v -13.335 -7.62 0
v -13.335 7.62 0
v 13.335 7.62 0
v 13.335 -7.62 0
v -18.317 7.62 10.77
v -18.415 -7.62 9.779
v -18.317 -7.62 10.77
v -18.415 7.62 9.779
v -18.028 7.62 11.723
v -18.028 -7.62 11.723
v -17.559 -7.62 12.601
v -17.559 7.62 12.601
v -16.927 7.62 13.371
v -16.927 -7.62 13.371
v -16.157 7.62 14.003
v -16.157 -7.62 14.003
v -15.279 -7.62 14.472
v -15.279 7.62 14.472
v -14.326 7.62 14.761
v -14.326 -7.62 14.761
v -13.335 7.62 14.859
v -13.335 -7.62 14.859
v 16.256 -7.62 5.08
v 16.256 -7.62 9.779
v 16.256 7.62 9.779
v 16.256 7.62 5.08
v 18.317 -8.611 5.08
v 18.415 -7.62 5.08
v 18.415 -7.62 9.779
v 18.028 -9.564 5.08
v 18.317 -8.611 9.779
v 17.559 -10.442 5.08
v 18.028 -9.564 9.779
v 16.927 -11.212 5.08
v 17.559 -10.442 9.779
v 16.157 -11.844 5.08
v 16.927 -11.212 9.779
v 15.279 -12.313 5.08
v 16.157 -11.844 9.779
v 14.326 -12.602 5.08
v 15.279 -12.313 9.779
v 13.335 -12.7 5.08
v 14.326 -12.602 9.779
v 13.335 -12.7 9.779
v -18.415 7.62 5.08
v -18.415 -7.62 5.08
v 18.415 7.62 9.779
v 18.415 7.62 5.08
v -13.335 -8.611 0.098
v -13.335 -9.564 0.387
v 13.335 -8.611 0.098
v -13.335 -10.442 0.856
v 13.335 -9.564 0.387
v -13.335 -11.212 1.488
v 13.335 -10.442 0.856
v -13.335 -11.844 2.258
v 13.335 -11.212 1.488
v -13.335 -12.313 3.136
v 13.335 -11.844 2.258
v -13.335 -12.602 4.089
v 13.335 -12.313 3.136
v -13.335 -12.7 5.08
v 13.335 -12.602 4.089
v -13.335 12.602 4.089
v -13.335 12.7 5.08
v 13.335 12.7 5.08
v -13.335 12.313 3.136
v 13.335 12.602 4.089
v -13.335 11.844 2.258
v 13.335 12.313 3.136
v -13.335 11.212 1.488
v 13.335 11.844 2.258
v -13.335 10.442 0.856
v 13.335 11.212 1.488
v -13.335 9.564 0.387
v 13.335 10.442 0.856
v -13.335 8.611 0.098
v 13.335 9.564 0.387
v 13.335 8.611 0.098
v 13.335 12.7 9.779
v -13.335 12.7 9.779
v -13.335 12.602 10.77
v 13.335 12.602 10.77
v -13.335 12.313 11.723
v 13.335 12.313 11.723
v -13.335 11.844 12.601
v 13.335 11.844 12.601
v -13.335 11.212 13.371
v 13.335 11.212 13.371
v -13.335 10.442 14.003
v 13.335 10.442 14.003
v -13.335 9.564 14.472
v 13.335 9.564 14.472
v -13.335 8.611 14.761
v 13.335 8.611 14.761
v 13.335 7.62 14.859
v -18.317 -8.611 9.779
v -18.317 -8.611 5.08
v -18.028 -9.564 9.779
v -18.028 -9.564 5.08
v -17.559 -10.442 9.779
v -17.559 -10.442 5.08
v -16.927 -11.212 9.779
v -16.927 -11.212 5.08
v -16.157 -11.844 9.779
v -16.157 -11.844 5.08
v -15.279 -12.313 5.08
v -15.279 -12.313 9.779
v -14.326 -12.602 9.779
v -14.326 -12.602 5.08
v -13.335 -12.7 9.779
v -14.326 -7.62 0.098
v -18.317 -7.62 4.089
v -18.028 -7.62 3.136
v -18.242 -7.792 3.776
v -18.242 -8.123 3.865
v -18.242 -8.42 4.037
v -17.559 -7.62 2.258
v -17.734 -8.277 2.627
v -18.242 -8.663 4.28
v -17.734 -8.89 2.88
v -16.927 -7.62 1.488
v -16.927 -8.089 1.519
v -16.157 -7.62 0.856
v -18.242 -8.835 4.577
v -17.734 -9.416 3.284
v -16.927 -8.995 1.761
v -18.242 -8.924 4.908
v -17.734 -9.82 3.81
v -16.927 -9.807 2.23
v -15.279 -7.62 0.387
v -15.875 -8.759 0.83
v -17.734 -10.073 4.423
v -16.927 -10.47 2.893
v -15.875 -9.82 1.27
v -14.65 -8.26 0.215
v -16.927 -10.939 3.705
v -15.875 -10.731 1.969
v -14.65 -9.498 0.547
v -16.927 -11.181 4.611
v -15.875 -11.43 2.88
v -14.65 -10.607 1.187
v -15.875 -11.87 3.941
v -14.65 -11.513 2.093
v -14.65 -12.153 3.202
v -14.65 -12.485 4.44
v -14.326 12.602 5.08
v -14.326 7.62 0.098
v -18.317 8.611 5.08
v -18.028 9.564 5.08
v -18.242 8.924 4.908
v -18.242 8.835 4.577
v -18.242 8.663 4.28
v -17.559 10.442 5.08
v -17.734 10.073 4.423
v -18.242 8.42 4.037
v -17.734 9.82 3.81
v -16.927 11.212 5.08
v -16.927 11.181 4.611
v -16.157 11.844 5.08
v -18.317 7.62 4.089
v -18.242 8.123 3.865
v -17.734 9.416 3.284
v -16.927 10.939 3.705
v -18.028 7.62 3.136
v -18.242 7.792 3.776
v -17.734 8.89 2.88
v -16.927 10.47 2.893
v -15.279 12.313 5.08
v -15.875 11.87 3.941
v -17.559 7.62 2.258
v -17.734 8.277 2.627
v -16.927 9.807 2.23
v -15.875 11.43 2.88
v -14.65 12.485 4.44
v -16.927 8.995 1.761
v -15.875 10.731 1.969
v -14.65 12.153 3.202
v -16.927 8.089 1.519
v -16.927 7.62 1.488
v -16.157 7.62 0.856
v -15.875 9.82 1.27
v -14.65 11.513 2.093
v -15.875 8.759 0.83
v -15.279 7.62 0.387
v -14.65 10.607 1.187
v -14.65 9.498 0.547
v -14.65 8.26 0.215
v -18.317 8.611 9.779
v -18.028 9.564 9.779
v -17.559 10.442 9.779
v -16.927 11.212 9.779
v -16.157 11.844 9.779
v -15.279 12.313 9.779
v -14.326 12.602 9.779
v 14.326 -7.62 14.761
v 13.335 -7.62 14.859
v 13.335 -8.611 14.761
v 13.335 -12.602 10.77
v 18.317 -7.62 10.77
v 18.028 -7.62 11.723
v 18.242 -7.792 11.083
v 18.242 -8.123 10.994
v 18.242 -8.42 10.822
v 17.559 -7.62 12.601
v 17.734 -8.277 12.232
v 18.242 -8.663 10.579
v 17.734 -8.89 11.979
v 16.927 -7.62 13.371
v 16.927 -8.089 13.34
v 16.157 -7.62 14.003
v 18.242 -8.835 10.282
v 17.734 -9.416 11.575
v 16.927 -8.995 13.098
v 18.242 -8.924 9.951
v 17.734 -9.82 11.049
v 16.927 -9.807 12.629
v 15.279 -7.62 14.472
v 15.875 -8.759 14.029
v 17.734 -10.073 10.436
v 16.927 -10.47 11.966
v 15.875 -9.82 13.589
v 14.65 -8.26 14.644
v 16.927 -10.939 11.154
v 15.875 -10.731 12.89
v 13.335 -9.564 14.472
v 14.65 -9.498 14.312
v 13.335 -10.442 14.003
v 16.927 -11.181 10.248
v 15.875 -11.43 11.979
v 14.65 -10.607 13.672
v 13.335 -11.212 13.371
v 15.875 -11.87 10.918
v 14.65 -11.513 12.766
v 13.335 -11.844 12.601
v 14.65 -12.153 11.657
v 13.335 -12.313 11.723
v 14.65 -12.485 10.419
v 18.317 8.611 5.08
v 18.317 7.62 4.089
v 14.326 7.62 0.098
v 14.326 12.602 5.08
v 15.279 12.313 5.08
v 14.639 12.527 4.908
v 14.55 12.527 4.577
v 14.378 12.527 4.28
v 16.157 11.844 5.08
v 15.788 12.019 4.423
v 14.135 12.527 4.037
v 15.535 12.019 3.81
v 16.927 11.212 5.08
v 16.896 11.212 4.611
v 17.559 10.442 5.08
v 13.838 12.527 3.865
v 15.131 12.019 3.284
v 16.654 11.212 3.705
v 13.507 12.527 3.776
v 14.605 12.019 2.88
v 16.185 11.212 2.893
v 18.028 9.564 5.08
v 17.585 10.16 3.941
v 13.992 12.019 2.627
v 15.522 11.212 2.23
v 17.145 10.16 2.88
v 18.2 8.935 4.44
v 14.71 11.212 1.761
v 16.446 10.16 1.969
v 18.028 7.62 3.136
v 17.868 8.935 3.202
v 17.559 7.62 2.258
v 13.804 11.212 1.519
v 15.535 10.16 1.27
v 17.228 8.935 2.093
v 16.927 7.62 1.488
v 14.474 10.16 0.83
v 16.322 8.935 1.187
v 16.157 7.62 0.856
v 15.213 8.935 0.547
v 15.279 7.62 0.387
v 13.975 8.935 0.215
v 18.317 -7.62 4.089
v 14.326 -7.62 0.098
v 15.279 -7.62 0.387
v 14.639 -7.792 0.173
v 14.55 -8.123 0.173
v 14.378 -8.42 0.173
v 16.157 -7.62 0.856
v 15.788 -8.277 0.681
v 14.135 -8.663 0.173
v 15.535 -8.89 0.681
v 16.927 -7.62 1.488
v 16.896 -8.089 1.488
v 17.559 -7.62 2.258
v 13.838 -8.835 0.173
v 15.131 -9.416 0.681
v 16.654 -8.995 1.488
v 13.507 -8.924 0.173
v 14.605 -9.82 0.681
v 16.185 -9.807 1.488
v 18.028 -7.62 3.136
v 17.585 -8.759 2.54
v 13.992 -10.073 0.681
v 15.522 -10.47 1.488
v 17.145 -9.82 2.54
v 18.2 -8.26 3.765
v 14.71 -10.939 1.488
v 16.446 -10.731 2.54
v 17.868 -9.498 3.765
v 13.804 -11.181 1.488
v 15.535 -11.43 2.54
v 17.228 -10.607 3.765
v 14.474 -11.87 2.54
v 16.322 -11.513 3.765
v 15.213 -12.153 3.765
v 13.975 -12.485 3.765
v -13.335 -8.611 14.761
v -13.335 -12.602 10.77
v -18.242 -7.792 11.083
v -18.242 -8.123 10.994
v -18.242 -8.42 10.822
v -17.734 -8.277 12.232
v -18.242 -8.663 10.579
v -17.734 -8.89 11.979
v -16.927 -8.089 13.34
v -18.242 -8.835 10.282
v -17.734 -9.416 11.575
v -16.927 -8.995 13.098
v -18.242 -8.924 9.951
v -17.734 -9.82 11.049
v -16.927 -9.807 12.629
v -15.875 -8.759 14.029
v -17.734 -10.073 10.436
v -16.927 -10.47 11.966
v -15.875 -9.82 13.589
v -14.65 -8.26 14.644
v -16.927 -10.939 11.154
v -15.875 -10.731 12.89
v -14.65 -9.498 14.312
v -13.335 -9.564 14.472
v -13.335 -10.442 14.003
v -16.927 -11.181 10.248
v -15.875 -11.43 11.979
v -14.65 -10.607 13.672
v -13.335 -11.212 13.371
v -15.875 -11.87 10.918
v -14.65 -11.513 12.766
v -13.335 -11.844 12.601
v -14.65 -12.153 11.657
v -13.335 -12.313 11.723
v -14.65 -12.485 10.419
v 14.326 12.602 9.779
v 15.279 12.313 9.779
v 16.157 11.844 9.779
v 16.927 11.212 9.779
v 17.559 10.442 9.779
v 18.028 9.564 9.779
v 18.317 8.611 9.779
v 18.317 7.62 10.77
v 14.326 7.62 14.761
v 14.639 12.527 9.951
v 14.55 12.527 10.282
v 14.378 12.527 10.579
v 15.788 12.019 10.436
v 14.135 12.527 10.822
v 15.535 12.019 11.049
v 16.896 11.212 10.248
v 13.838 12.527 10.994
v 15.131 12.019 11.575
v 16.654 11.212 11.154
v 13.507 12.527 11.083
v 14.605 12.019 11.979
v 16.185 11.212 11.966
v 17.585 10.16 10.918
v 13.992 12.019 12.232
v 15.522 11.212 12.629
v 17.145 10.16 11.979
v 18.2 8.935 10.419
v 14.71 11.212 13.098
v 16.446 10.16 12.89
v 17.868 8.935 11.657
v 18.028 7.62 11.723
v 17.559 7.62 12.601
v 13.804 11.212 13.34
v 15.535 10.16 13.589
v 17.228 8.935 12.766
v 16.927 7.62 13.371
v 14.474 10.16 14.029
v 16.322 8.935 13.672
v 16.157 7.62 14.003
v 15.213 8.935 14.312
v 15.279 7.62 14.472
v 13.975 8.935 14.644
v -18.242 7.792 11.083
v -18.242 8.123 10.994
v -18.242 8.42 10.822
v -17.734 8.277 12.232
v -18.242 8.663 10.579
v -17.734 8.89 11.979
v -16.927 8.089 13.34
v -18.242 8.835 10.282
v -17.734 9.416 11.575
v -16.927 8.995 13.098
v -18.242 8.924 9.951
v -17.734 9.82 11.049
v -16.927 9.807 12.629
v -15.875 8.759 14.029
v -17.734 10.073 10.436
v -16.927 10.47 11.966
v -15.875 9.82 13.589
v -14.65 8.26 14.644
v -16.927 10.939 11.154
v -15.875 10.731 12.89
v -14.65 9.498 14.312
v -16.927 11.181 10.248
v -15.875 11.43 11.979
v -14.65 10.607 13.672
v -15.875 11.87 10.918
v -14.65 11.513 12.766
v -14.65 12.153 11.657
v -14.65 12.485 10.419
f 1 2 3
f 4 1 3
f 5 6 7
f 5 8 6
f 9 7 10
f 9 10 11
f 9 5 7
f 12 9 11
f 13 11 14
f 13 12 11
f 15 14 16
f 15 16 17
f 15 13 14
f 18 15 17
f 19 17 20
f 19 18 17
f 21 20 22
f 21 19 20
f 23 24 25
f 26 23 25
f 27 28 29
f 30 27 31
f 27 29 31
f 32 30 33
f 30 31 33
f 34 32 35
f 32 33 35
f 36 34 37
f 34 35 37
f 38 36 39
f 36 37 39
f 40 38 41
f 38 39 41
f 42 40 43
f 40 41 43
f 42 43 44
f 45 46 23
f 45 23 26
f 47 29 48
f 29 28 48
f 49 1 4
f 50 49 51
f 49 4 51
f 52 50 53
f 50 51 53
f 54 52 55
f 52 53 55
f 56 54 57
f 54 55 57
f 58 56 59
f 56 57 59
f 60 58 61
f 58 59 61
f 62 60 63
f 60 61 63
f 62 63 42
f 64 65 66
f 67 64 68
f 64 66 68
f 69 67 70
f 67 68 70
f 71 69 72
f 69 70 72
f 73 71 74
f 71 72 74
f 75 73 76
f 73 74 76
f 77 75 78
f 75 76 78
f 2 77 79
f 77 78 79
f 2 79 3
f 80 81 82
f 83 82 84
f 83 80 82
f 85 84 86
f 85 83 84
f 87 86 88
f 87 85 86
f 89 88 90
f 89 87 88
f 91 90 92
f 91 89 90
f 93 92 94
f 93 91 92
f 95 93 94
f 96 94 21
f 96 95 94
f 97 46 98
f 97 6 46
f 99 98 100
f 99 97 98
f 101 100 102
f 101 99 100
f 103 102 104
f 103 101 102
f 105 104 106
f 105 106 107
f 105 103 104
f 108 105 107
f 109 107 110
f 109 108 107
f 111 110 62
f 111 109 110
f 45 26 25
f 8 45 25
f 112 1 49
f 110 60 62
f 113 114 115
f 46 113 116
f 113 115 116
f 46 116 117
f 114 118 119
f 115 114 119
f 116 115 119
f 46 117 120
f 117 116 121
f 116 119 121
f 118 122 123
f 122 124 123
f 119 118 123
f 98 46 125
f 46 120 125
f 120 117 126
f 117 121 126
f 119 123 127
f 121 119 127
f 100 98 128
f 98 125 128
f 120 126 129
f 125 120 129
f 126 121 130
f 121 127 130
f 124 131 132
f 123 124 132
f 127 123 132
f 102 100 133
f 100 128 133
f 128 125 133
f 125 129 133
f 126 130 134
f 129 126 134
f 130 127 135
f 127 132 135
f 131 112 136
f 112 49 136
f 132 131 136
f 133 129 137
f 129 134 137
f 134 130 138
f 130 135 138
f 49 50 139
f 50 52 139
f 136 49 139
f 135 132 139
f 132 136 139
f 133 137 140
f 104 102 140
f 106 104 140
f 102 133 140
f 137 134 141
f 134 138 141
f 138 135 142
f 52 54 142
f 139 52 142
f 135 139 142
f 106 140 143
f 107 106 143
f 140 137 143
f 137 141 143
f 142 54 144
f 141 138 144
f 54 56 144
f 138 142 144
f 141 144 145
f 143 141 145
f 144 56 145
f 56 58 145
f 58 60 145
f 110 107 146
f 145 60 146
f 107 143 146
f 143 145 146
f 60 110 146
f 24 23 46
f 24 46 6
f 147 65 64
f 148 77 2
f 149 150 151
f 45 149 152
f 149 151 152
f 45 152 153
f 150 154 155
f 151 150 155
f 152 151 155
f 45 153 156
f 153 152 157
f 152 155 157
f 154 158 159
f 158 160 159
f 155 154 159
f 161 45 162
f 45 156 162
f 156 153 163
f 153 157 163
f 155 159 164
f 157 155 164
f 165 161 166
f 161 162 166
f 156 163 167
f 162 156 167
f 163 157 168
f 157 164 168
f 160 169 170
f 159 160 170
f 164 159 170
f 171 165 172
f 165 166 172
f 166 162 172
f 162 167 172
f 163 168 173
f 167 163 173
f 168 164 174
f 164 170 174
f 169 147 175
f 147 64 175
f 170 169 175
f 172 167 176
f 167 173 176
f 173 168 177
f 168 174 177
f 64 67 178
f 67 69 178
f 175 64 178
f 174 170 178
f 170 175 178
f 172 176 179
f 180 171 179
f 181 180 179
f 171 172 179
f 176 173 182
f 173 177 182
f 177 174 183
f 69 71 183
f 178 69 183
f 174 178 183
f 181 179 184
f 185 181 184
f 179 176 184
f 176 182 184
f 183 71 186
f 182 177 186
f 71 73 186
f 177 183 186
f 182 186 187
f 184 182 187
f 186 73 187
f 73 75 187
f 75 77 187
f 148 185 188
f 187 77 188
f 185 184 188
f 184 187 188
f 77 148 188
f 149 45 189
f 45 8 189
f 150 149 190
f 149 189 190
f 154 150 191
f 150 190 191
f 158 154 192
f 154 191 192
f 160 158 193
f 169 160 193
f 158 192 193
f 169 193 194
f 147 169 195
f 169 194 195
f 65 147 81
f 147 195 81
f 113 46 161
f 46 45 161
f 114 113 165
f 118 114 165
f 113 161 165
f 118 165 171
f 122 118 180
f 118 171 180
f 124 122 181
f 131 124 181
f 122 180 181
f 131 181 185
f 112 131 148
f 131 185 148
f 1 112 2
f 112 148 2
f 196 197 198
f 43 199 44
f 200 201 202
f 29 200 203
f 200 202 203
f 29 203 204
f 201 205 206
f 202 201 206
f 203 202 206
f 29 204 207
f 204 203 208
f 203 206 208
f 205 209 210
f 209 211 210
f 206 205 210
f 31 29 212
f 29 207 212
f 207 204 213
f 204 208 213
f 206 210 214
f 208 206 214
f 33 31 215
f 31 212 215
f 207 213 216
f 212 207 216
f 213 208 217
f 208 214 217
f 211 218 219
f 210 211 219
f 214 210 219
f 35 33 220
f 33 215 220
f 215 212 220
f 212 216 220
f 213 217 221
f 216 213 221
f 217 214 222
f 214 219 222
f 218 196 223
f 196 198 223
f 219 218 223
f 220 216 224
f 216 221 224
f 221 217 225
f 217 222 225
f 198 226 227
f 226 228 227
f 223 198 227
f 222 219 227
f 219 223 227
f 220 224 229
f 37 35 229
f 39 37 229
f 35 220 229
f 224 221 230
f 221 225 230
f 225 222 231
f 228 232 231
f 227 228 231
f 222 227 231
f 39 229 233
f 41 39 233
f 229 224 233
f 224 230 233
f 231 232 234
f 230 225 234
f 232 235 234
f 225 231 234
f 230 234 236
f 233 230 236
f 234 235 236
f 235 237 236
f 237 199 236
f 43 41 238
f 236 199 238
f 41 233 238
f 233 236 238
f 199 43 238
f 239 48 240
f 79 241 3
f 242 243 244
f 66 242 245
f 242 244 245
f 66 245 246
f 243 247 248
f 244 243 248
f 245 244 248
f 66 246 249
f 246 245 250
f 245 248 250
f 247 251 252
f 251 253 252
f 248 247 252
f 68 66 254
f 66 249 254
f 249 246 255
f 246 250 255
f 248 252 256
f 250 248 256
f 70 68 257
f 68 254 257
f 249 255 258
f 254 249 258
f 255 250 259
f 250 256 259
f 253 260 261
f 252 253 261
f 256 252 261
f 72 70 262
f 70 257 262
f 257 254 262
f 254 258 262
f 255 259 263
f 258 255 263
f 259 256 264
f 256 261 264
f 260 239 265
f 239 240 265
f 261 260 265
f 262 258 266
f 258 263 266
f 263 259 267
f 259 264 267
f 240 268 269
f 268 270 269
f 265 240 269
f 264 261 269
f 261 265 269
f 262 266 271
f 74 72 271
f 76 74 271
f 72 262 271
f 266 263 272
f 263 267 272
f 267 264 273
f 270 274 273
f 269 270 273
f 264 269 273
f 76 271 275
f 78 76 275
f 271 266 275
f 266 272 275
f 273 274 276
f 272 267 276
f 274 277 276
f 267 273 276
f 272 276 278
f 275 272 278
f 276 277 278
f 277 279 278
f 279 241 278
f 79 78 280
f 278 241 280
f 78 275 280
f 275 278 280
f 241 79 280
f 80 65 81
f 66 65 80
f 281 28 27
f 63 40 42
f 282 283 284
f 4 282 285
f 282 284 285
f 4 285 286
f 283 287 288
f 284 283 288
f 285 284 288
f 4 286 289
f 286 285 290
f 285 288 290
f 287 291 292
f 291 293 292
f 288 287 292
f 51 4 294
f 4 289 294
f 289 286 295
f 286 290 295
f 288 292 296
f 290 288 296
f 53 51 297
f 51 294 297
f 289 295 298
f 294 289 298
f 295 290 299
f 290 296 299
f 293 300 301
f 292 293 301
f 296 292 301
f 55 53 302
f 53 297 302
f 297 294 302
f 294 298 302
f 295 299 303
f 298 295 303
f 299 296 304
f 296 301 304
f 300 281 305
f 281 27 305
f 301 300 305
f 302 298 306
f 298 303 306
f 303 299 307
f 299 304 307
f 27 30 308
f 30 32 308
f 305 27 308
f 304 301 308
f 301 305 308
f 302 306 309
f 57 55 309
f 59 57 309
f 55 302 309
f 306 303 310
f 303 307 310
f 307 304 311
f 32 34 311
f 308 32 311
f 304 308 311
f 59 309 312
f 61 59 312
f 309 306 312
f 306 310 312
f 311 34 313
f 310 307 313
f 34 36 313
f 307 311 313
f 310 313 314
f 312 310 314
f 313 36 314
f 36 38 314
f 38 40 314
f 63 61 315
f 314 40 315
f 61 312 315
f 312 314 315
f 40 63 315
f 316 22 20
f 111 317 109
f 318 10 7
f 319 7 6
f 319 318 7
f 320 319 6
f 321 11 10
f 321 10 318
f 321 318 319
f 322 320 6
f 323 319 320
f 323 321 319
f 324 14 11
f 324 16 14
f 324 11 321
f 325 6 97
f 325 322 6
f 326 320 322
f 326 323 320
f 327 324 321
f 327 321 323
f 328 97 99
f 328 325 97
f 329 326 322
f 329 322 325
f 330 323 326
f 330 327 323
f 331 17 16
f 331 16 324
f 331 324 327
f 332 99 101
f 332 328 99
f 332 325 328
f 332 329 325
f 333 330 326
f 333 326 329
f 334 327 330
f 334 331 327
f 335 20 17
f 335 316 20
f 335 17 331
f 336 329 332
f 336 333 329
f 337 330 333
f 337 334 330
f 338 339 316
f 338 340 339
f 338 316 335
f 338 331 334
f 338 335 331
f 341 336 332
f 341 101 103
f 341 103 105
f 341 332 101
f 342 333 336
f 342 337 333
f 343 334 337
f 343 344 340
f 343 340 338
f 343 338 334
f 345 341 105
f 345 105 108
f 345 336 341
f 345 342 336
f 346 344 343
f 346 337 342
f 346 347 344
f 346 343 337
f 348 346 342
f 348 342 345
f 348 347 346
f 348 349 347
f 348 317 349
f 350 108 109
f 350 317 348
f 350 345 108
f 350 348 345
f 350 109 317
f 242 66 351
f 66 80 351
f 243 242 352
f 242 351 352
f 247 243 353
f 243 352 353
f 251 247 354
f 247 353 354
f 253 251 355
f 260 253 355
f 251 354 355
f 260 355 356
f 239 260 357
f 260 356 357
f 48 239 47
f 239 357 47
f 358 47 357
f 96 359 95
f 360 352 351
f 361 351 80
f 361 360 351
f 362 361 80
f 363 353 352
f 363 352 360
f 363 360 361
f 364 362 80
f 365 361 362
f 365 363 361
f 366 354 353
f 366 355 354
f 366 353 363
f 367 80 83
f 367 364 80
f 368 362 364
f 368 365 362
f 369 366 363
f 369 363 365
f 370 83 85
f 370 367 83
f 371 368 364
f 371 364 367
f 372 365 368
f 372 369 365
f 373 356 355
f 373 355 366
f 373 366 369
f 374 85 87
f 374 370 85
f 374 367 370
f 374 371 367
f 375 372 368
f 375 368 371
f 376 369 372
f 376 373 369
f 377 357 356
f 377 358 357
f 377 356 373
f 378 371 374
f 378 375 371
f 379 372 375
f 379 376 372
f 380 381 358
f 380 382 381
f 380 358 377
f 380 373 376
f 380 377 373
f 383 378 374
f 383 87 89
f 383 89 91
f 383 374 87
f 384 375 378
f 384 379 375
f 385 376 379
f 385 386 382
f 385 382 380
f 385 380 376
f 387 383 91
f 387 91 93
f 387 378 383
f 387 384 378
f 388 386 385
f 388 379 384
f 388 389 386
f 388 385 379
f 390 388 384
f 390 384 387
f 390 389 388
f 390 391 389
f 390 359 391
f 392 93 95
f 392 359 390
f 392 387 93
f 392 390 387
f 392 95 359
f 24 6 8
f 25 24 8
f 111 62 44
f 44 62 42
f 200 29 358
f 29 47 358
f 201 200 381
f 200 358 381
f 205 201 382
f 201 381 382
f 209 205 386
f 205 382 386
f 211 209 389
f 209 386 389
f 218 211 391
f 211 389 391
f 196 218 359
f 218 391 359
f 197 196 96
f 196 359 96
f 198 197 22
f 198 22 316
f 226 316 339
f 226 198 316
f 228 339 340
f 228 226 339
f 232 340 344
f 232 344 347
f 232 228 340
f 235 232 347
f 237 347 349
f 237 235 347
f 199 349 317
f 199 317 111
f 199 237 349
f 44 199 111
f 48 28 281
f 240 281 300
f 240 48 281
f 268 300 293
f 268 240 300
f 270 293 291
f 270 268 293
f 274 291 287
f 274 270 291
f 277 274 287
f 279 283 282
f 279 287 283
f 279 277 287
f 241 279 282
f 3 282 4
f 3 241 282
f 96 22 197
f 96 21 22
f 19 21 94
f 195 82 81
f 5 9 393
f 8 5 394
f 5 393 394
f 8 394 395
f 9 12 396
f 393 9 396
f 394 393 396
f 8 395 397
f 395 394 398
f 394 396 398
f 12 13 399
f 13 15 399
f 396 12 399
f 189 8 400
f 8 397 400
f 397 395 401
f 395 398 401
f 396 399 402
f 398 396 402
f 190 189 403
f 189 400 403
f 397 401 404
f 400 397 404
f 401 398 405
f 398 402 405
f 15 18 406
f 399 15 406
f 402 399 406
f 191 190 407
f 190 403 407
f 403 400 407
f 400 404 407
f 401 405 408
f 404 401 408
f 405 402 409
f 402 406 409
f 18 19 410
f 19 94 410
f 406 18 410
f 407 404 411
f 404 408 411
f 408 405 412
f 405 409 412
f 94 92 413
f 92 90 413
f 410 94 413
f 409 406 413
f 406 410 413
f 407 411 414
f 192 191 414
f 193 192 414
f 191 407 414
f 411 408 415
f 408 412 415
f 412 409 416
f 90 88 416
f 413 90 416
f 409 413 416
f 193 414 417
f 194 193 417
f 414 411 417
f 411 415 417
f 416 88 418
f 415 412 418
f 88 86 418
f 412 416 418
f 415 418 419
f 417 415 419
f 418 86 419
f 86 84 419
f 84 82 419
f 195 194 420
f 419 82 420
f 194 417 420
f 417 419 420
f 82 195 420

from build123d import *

# Parameters (mm, degrees)
F0_W     = 36.83
F0_H     = 25.4
F1_DEPTH = 14.859
F2_W     = 15.24
F2_H     = 4.699
F3_DEPTH = 18.542
F4_DEPTH = 16.256
F5_R     = 5.07999


# Not quite as in the source:
# - a fillet or chamfer is up to 0.001 mm smaller than in the source, because OpenCascade refuses the exact size


with BuildPart() as f1:
    # F0 (on Top) → F1 (new body)
    with BuildSketch(Plane.XY):
        Rectangle(F0_W, F0_H)
    extrude(amount=F1_DEPTH)

    # F2 (on Right) → F3 (cut)
    with BuildSketch(Plane.YZ):
        with Locations((0, 7.4295)):
            Rectangle(F2_W, F2_H)
    extrude(amount=-F3_DEPTH, mode=Mode.SUBTRACT)

    # F2 (on Right) → F4 (cut)
    with BuildSketch(Plane.YZ):
        with Locations((0, 7.4295)):
            Rectangle(F2_W, F2_H)
    extrude(amount=F4_DEPTH, mode=Mode.SUBTRACT)

    # F5 (radius 5.08 in the source; OpenCascade refuses exactly that, so slightly less here)
    f5_edges = [f1.edges().sort_by_distance(p)[0] for p in [
        (0, -12.7, 14.859),
        (18.415, 0, 14.859),
        (18.415, -12.7, 7.4295),
        (18.415, 0, 0),
        (18.415, 12.7, 7.4295),
        (0, 12.7, 0),
        (0, -12.7, 0),
        (0, 12.7, 14.859),
        (-18.415, 0, 14.859),
        (-18.415, 12.7, 7.4295),
        (-18.415, 0, 0),
        (-18.415, -12.7, 7.4295),
    ]]
    fillet(f5_edges, radius=F5_R)


solid = f1.part
